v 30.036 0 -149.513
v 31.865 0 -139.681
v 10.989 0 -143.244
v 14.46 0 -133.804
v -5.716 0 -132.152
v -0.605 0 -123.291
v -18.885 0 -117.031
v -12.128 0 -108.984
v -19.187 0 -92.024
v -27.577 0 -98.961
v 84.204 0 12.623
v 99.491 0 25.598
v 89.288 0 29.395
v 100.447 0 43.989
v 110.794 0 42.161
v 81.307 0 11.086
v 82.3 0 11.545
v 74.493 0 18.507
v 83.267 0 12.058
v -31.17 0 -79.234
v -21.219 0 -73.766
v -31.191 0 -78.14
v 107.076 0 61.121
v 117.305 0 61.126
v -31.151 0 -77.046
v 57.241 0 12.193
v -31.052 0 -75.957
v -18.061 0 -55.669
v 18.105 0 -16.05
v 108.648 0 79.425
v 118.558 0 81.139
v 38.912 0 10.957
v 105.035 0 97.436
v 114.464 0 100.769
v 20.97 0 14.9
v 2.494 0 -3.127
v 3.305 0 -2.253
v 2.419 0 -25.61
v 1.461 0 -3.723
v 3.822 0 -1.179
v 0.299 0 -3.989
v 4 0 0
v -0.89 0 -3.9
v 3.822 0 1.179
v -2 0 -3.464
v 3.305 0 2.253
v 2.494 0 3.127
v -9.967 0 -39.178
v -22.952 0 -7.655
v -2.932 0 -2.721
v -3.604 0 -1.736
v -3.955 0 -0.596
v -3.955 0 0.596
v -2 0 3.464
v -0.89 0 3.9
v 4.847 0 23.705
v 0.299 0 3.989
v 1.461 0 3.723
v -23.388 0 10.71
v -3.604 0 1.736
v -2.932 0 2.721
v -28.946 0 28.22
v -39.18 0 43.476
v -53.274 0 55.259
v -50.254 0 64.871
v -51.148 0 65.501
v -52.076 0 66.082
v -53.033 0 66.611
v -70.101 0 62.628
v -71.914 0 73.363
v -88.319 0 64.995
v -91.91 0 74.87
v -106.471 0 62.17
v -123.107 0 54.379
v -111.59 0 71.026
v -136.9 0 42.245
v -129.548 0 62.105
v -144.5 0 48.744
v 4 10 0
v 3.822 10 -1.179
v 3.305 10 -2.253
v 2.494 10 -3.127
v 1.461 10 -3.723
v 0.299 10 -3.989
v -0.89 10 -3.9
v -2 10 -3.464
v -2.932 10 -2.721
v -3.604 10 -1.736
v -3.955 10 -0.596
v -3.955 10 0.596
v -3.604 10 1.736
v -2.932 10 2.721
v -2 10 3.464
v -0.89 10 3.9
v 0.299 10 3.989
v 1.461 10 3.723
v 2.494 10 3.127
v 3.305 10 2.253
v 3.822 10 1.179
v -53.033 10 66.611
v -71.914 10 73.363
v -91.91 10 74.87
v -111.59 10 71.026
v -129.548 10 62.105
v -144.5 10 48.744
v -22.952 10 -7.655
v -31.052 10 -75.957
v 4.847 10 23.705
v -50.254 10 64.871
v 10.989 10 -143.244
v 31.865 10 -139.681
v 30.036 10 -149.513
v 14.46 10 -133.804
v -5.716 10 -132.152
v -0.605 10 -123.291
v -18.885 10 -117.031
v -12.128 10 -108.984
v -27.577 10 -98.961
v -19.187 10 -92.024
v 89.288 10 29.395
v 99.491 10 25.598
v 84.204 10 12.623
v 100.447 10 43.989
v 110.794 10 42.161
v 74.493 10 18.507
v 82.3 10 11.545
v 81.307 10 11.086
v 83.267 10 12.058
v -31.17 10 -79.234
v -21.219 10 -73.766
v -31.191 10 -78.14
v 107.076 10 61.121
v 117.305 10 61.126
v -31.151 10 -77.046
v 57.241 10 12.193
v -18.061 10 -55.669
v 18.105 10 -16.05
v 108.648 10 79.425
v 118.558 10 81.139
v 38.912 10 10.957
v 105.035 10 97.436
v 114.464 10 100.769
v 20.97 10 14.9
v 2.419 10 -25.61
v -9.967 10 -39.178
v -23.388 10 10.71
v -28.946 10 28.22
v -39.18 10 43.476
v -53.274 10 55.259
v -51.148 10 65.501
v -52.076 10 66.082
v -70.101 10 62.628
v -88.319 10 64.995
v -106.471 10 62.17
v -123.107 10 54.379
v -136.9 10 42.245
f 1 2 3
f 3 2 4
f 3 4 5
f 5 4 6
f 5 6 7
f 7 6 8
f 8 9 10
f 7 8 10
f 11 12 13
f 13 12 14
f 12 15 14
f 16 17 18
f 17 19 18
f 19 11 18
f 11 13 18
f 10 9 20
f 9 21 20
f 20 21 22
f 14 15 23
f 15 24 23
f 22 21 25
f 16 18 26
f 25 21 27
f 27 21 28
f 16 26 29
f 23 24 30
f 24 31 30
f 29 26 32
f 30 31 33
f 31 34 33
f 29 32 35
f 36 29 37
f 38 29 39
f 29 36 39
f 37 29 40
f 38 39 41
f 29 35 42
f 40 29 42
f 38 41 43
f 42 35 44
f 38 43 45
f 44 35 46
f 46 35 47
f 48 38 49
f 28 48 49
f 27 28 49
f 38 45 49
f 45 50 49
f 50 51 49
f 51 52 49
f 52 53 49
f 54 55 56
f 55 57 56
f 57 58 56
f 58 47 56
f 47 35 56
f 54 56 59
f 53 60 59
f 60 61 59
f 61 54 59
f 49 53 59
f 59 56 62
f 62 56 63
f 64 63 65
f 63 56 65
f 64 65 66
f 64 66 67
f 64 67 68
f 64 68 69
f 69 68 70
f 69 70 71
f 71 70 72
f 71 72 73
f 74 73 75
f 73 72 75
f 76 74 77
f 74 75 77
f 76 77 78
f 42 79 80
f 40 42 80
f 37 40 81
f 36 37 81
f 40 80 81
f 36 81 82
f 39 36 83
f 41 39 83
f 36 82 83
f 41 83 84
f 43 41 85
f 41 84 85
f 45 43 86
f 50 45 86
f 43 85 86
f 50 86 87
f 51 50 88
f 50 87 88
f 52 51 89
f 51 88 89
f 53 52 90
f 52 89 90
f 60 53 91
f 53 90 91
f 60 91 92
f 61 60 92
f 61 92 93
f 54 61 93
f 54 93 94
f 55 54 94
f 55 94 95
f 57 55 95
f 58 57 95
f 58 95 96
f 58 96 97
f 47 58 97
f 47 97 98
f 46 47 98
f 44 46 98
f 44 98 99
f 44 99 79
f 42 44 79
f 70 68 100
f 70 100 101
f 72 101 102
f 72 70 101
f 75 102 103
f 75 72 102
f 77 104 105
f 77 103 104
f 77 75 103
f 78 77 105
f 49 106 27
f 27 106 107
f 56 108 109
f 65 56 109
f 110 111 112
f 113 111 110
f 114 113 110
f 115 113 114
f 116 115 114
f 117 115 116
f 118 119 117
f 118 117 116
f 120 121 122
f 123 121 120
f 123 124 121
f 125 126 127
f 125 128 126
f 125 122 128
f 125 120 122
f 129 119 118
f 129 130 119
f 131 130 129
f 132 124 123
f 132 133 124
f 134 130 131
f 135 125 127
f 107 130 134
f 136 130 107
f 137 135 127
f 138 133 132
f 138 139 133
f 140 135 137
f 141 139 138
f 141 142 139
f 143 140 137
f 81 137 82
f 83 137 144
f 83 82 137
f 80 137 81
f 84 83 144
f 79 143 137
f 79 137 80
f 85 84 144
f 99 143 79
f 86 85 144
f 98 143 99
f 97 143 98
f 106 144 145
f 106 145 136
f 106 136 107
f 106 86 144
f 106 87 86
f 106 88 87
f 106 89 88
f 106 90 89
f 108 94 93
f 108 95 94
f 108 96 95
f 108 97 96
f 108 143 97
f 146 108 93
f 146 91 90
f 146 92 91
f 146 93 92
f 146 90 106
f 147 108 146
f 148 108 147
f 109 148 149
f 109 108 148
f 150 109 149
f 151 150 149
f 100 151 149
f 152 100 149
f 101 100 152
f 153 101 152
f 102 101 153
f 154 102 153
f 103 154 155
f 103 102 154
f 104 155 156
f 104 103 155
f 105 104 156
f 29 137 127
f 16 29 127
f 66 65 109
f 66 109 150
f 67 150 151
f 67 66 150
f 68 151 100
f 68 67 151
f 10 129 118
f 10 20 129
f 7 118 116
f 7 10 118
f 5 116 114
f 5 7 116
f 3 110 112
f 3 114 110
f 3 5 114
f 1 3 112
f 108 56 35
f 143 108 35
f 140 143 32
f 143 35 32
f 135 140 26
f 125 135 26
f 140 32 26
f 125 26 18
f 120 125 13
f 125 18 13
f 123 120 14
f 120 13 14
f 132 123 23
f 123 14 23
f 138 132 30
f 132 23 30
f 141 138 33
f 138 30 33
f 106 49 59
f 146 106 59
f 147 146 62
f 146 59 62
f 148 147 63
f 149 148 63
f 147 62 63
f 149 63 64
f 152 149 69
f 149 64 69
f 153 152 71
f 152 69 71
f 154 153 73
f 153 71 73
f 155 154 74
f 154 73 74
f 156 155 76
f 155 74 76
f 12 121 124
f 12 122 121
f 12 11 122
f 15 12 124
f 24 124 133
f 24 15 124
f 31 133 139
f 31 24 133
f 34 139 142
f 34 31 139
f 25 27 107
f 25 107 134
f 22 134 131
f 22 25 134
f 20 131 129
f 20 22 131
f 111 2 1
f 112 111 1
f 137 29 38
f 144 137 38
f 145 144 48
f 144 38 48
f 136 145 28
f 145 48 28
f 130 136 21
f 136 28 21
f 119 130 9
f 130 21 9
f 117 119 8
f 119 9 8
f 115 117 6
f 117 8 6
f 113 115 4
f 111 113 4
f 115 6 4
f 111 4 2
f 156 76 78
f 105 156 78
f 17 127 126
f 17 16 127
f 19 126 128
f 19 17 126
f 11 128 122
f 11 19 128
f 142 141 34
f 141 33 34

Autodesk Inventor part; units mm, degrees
ref_plane "YZ Plane" through (0, 0, 0) normal (1, 0, 0) x (0, 1, 0)
ref_plane "XZ Plane" through (0, 0, 0) normal (0, 1, 0) x (-1, 0, 0)
ref_plane "XY Plane" through (0, 0, 0) normal (0, 0, 1) x (1, 0, 0)
sketch "Эскиз1" plane through (0, 0, 0) normal (0, 1, 0) x (-1, 0, 0)
  circle A0 centre (0, 0) radius 152.5
  line L0 (0, 0) -> (152.5, 0)
  circle A1 centre (87.5, 0) radius 65
  circle A2 centre (-43.75, 75.777223) radius 65
  circle A3 centre (-43.75, -75.777223) radius 65
  circle A4 centre (87.5, 0) radius 75
  circle A5 centre (-43.75, 75.777223) radius 75
  circle A6 centre (-43.75, -75.777223) radius 75
  line L1 (0, 0) -> (-76.25, 132.068874)
  line L2 (0, 0) -> (-76.25, -132.068874)
  line L3 (144.5, 48.74423) -> (30.5, -48.74423)
  line L4 (-114.463742, 100.768556) -> (26.963742, 50.78589)
  line L5 (-30.036258, -149.512786) -> (-57.463742, -2.04166)
  line L6 (30.5, -48.74423) -> (26.963742, -50.78589)
  line L7 (26.963742, 50.78589) -> (30.5, 48.74423)
  line L8 (-57.463742, -2.04166) -> (-57.463742, 2.04166)
  point P0 (14.069297, 24.368737)
  point P1 (-28.138593, 0)
  point P2 (14.069297, -24.368737)
  point P3 (12.5, 0)
  point P4 (22.5, 0)
  point P5 (152.5, 0)
  point P6 (-6.25, 10.825318)
  point P7 (-11.25, 19.485572)
  point P8 (-76.25, 132.068874)
  point P9 (-114.463742, 100.768556)
  point P10 (-6.25, -10.825318)
  point P11 (-11.25, -19.485572)
  point P12 (-76.25, -132.068874)
  point P13 (-30.036258, -149.512786)
  point P14 (-114.463742, -100.768556)
  point P15 (-30.036258, 149.512786)
  point P16 (144.5, -48.74423)
  point P17 (152.5, 0)
  point P18 (136.9, 42.245)
  point P19 (17.535243, 54.118068)
  point P20 (-105.035243, 97.436378)
  point P21 (-114.463742, 100.768556)
  point P22 (-57.463742, -2.04166)
  point P23 (-55.635243, -11.873068)
  point P24 (-31.864757, -139.681378)
  point P25 (-30.036258, -149.512786)
  point P26 (38.1, -42.245)
  dimension "d0" = 305
  dimension "d1" = 130
  dimension "d2" = 0
  dimension "d5" = 360
  dimension "d7" = 150
  dimension "d10" = 360
  dimension "d16" = 360
  dimension "d18" = 0
  dimension "d21" = 360
  dimension "d25" = 360
sketch "Эскиз1 outline for Выдавливание1" plane through (0, 0, 0) normal (0, 1, 0) x (-1, 0, 0)
  line L0 (136.9, 42.245) -> (144.5, 48.74423)
  arc A0 (38.1, -42.245) -> (136.9, 42.245) centre (87.5, 0) cw
  line L1 (30.5, -48.74423) -> (38.1, -42.245)
  line L2 (26.963742, -50.78589) -> (30.5, -48.74423)
  arc A1 (-30.036258, -149.512786) -> (26.963742, -50.78589) centre (-43.75, -75.777223) ccw
  line L3 (-31.864757, -139.681378) -> (-30.036258, -149.512786)
  arc A2 (-55.635243, -11.873068) -> (-31.864757, -139.681378) centre (-43.75, -75.777223) cw
  line L4 (-57.463742, -2.04166) -> (-55.635243, -11.873068)
  line L5 (-57.463742, 2.04166) -> (-57.463742, -2.04166)
  arc A3 (-114.463742, 100.768556) -> (-57.463742, 2.04166) centre (-43.75, 75.777223) ccw
  line L6 (-105.035243, 97.436378) -> (-114.463742, 100.768556)
  arc A4 (17.535243, 54.118068) -> (-105.035243, 97.436378) centre (-43.75, 75.777223) cw
  line L7 (26.963742, 50.78589) -> (17.535243, 54.118068)
  line L8 (30.5, 48.74423) -> (26.963742, 50.78589)
  arc A5 (144.5, 48.74423) -> (30.5, 48.74423) centre (87.5, 0) ccw
extrude "Выдавливание1" add sketch "Эскиз1 outline for Выдавливание1" along normal blind 10
chamfer "Фаска1" distance 10 angle 45 3 edges at (55.6352, 5, -11.8731) (-17.5352, 5, 54.1181) (-38.1, 5, -42.245)
sketch "Эскиз2" plane through (0, 10, 0) normal (0, 1, 0) x (1, 0, 0)
  line L0 (-32.204642, 34.167577) -> (-30.5, 48.74423)
  line L1 (-32.204642, 34.167577) -> (-31.020127, 86.842802)
  arc A0 (30.036258, 149.512786) -> (-26.963742, 50.78589) centre (43.75, 75.777223) ccw
  line L2 (-13.487669, -44.973827) -> (-59.698009, -70.285619)
  line L3 (45.692311, 10.806249) -> (90.718136, -16.557183)
  line L4 (-32.204642, 34.167577) -> (-30.5, 48.74423)
  arc A1 (-136.9, -42.245) -> (-32.204642, 34.167577) centre (-87.5, 0) ccw
  line L5 (-136.9, -42.245) -> (-144.5, -48.74423)
  arc A2 (-144.5, -48.74423) -> (-30.5, -48.74423) centre (-87.5, 0) ccw
  line L6 (-30.5, -48.74423) -> (-26.963742, -50.78589)
  line L7 (-13.487669, -44.973827) -> (-26.963742, -50.78589)
  arc A3 (105.035243, -97.436378) -> (-13.487669, -44.973827) centre (43.75, -75.777223) ccw
  line L8 (105.035243, -97.436378) -> (114.463742, -100.768556)
  arc A4 (114.463742, -100.768556) -> (57.463742, -2.04166) centre (43.75, -75.777223) ccw
  line L9 (57.463742, -2.04166) -> (57.463742, 2.04166)
  line L10 (45.692311, 10.806249) -> (57.463742, 2.04166)
  arc A5 (31.864757, 139.681378) -> (45.692311, 10.806249) centre (43.75, 75.777223) ccw
  line L11 (31.864757, 139.681378) -> (30.036258, 149.512786)
  arc A6 (30.036258, 149.512786) -> (-26.963742, 50.78589) centre (43.75, 75.777223) ccw
  line L12 (-26.963742, 50.78589) -> (-30.5, 48.74423)
  point P0 (0, 0)
  point P1 (82.700735, -11.684788)
  point P2 (-51.46969, -65.778544)
  point P3 (-31.231045, 77.463331)
  dimension "d32" = 360
sketch "Эскиз2 outline for Выдавливание2" plane through (0, 10, 0) normal (0, 1, 0) x (1, 0, 0)
  line L0 (57.463742, 2.04166) -> (57.463742, -2.04166)
  line L1 (45.692311, 10.806249) -> (57.463742, 2.04166)
  line L2 (82.700735, -11.684788) -> (45.692311, 10.806249)
  arc A0 (57.463742, -2.04166) -> (82.700735, -11.684788) centre (43.75, -75.777223) cw
  line L3 (-26.963742, -50.78589) -> (-30.5, -48.74423)
  line L4 (-13.487669, -44.973827) -> (-26.963742, -50.78589)
  line L5 (-51.46969, -65.778544) -> (-13.487669, -44.973827)
  arc A1 (-30.5, -48.74423) -> (-51.46969, -65.778544) centre (-87.5, 0) cw
  line L6 (-30.5, 48.74423) -> (-26.963742, 50.78589)
  line L7 (-32.204642, 34.167577) -> (-30.5, 48.74423)
  line L8 (-31.231045, 77.463331) -> (-32.204642, 34.167577)
  arc A2 (-26.963742, 50.78589) -> (-31.231045, 77.463331) centre (43.75, 75.777223) cw
extrude "Выдавливание2" add sketch "Эскиз2 outline for Выдавливание2" against normal blind 10
sketch "Эскиз3" plane through (0, 10, 0) normal (0, 1, 0) x (1, 0, 0)
  arc A0 (-136.9, -42.245) -> (-32.204642, 34.167577) centre (-87.5, 0) ccw
  line L0 (-136.9, -42.245) -> (-144.5, -48.74423)
  arc A1 (-144.5, -48.74423) -> (-51.46969, -65.778544) centre (-87.5, 0) ccw
  line L1 (-51.46969, -65.778544) -> (-13.487669, -44.973827)
  arc A2 (105.035243, -97.436378) -> (-13.487669, -44.973827) centre (43.75, -75.777223) ccw
  line L2 (105.035243, -97.436378) -> (114.463742, -100.768556)
  arc A3 (114.463742, -100.768556) -> (82.700735, -11.684788) centre (43.75, -75.777223) ccw
  line L3 (82.700735, -11.684788) -> (45.692311, 10.806249)
  arc A4 (31.864757, 139.681378) -> (45.692311, 10.806249) centre (43.75, 75.777223) ccw
  line L4 (31.864757, 139.681378) -> (30.036258, 149.512786)
  arc A5 (30.036258, 149.512786) -> (-31.231045, 77.463331) centre (43.75, 75.777223) ccw
  line L5 (-31.231045, 77.463331) -> (-32.204642, 34.167577)
  line L6 (-31.231045, 77.463331) -> (-15.37541, -56.235706)
  line L7 (-51.46969, -65.778544) -> (56.389255, 14.802358)
  line L8 (82.700735, -11.684788) -> (-41.013845, 41.433348)
  point P0 (0, 0)
  point P1 (4.846874, -23.704708)
  point P2 (18.105443, 16.04987)
  point P3 (-22.952316, 7.654838)
  dimension "d38" = 360
sketch "Эскиз3 outline for Выдавливание3" plane through (0, 10, 0) normal (0, 1, 0) x (1, 0, 0)
  line L0 (4.846874, -23.704708) -> (-51.46969, -65.778544)
  arc A0 (-13.487669, -44.973827) -> (4.846874, -23.704708) centre (43.75, -75.777223) cw
  line L1 (-51.46969, -65.778544) -> (-13.487669, -44.973827)
  line L2 (18.105443, 16.04987) -> (82.700735, -11.684788)
  arc A1 (45.692311, 10.806249) -> (18.105443, 16.04987) centre (43.75, 75.777223) cw
  line L3 (82.700735, -11.684788) -> (45.692311, 10.806249)
  line L4 (-22.952316, 7.654838) -> (-31.231045, 77.463331)
  arc A2 (-32.204642, 34.167577) -> (-22.952316, 7.654838) centre (-87.5, 0) cw
  line L5 (-31.231045, 77.463331) -> (-32.204642, 34.167577)
extrude "Выдавливание3" cut sketch "Эскиз3 outline for Выдавливание3" against normal through all
fillet "Сопряжение1" radius 20 3 edges at (82.7007, 5, 11.6848) (-51.4697, 5, 65.7785) (-31.231, 5, -77.4633)
sketch "Эскиз4" plane through (0, 10, 0) normal (0, 1, 0) x (1, 0, 0)
  circle A0 centre (0, 0) radius 4
  dimension "d43" = 8
sketch "Эскиз4 outline for Выдавливание4" plane through (0, 10, 0) normal (0, 1, 0) x (1, 0, 0)
  circle A0 centre (0, 0) radius 4
extrude "Выдавливание4" cut sketch "Эскиз4 outline for Выдавливание4" against normal blind 140
properties part number "сюрикен"
